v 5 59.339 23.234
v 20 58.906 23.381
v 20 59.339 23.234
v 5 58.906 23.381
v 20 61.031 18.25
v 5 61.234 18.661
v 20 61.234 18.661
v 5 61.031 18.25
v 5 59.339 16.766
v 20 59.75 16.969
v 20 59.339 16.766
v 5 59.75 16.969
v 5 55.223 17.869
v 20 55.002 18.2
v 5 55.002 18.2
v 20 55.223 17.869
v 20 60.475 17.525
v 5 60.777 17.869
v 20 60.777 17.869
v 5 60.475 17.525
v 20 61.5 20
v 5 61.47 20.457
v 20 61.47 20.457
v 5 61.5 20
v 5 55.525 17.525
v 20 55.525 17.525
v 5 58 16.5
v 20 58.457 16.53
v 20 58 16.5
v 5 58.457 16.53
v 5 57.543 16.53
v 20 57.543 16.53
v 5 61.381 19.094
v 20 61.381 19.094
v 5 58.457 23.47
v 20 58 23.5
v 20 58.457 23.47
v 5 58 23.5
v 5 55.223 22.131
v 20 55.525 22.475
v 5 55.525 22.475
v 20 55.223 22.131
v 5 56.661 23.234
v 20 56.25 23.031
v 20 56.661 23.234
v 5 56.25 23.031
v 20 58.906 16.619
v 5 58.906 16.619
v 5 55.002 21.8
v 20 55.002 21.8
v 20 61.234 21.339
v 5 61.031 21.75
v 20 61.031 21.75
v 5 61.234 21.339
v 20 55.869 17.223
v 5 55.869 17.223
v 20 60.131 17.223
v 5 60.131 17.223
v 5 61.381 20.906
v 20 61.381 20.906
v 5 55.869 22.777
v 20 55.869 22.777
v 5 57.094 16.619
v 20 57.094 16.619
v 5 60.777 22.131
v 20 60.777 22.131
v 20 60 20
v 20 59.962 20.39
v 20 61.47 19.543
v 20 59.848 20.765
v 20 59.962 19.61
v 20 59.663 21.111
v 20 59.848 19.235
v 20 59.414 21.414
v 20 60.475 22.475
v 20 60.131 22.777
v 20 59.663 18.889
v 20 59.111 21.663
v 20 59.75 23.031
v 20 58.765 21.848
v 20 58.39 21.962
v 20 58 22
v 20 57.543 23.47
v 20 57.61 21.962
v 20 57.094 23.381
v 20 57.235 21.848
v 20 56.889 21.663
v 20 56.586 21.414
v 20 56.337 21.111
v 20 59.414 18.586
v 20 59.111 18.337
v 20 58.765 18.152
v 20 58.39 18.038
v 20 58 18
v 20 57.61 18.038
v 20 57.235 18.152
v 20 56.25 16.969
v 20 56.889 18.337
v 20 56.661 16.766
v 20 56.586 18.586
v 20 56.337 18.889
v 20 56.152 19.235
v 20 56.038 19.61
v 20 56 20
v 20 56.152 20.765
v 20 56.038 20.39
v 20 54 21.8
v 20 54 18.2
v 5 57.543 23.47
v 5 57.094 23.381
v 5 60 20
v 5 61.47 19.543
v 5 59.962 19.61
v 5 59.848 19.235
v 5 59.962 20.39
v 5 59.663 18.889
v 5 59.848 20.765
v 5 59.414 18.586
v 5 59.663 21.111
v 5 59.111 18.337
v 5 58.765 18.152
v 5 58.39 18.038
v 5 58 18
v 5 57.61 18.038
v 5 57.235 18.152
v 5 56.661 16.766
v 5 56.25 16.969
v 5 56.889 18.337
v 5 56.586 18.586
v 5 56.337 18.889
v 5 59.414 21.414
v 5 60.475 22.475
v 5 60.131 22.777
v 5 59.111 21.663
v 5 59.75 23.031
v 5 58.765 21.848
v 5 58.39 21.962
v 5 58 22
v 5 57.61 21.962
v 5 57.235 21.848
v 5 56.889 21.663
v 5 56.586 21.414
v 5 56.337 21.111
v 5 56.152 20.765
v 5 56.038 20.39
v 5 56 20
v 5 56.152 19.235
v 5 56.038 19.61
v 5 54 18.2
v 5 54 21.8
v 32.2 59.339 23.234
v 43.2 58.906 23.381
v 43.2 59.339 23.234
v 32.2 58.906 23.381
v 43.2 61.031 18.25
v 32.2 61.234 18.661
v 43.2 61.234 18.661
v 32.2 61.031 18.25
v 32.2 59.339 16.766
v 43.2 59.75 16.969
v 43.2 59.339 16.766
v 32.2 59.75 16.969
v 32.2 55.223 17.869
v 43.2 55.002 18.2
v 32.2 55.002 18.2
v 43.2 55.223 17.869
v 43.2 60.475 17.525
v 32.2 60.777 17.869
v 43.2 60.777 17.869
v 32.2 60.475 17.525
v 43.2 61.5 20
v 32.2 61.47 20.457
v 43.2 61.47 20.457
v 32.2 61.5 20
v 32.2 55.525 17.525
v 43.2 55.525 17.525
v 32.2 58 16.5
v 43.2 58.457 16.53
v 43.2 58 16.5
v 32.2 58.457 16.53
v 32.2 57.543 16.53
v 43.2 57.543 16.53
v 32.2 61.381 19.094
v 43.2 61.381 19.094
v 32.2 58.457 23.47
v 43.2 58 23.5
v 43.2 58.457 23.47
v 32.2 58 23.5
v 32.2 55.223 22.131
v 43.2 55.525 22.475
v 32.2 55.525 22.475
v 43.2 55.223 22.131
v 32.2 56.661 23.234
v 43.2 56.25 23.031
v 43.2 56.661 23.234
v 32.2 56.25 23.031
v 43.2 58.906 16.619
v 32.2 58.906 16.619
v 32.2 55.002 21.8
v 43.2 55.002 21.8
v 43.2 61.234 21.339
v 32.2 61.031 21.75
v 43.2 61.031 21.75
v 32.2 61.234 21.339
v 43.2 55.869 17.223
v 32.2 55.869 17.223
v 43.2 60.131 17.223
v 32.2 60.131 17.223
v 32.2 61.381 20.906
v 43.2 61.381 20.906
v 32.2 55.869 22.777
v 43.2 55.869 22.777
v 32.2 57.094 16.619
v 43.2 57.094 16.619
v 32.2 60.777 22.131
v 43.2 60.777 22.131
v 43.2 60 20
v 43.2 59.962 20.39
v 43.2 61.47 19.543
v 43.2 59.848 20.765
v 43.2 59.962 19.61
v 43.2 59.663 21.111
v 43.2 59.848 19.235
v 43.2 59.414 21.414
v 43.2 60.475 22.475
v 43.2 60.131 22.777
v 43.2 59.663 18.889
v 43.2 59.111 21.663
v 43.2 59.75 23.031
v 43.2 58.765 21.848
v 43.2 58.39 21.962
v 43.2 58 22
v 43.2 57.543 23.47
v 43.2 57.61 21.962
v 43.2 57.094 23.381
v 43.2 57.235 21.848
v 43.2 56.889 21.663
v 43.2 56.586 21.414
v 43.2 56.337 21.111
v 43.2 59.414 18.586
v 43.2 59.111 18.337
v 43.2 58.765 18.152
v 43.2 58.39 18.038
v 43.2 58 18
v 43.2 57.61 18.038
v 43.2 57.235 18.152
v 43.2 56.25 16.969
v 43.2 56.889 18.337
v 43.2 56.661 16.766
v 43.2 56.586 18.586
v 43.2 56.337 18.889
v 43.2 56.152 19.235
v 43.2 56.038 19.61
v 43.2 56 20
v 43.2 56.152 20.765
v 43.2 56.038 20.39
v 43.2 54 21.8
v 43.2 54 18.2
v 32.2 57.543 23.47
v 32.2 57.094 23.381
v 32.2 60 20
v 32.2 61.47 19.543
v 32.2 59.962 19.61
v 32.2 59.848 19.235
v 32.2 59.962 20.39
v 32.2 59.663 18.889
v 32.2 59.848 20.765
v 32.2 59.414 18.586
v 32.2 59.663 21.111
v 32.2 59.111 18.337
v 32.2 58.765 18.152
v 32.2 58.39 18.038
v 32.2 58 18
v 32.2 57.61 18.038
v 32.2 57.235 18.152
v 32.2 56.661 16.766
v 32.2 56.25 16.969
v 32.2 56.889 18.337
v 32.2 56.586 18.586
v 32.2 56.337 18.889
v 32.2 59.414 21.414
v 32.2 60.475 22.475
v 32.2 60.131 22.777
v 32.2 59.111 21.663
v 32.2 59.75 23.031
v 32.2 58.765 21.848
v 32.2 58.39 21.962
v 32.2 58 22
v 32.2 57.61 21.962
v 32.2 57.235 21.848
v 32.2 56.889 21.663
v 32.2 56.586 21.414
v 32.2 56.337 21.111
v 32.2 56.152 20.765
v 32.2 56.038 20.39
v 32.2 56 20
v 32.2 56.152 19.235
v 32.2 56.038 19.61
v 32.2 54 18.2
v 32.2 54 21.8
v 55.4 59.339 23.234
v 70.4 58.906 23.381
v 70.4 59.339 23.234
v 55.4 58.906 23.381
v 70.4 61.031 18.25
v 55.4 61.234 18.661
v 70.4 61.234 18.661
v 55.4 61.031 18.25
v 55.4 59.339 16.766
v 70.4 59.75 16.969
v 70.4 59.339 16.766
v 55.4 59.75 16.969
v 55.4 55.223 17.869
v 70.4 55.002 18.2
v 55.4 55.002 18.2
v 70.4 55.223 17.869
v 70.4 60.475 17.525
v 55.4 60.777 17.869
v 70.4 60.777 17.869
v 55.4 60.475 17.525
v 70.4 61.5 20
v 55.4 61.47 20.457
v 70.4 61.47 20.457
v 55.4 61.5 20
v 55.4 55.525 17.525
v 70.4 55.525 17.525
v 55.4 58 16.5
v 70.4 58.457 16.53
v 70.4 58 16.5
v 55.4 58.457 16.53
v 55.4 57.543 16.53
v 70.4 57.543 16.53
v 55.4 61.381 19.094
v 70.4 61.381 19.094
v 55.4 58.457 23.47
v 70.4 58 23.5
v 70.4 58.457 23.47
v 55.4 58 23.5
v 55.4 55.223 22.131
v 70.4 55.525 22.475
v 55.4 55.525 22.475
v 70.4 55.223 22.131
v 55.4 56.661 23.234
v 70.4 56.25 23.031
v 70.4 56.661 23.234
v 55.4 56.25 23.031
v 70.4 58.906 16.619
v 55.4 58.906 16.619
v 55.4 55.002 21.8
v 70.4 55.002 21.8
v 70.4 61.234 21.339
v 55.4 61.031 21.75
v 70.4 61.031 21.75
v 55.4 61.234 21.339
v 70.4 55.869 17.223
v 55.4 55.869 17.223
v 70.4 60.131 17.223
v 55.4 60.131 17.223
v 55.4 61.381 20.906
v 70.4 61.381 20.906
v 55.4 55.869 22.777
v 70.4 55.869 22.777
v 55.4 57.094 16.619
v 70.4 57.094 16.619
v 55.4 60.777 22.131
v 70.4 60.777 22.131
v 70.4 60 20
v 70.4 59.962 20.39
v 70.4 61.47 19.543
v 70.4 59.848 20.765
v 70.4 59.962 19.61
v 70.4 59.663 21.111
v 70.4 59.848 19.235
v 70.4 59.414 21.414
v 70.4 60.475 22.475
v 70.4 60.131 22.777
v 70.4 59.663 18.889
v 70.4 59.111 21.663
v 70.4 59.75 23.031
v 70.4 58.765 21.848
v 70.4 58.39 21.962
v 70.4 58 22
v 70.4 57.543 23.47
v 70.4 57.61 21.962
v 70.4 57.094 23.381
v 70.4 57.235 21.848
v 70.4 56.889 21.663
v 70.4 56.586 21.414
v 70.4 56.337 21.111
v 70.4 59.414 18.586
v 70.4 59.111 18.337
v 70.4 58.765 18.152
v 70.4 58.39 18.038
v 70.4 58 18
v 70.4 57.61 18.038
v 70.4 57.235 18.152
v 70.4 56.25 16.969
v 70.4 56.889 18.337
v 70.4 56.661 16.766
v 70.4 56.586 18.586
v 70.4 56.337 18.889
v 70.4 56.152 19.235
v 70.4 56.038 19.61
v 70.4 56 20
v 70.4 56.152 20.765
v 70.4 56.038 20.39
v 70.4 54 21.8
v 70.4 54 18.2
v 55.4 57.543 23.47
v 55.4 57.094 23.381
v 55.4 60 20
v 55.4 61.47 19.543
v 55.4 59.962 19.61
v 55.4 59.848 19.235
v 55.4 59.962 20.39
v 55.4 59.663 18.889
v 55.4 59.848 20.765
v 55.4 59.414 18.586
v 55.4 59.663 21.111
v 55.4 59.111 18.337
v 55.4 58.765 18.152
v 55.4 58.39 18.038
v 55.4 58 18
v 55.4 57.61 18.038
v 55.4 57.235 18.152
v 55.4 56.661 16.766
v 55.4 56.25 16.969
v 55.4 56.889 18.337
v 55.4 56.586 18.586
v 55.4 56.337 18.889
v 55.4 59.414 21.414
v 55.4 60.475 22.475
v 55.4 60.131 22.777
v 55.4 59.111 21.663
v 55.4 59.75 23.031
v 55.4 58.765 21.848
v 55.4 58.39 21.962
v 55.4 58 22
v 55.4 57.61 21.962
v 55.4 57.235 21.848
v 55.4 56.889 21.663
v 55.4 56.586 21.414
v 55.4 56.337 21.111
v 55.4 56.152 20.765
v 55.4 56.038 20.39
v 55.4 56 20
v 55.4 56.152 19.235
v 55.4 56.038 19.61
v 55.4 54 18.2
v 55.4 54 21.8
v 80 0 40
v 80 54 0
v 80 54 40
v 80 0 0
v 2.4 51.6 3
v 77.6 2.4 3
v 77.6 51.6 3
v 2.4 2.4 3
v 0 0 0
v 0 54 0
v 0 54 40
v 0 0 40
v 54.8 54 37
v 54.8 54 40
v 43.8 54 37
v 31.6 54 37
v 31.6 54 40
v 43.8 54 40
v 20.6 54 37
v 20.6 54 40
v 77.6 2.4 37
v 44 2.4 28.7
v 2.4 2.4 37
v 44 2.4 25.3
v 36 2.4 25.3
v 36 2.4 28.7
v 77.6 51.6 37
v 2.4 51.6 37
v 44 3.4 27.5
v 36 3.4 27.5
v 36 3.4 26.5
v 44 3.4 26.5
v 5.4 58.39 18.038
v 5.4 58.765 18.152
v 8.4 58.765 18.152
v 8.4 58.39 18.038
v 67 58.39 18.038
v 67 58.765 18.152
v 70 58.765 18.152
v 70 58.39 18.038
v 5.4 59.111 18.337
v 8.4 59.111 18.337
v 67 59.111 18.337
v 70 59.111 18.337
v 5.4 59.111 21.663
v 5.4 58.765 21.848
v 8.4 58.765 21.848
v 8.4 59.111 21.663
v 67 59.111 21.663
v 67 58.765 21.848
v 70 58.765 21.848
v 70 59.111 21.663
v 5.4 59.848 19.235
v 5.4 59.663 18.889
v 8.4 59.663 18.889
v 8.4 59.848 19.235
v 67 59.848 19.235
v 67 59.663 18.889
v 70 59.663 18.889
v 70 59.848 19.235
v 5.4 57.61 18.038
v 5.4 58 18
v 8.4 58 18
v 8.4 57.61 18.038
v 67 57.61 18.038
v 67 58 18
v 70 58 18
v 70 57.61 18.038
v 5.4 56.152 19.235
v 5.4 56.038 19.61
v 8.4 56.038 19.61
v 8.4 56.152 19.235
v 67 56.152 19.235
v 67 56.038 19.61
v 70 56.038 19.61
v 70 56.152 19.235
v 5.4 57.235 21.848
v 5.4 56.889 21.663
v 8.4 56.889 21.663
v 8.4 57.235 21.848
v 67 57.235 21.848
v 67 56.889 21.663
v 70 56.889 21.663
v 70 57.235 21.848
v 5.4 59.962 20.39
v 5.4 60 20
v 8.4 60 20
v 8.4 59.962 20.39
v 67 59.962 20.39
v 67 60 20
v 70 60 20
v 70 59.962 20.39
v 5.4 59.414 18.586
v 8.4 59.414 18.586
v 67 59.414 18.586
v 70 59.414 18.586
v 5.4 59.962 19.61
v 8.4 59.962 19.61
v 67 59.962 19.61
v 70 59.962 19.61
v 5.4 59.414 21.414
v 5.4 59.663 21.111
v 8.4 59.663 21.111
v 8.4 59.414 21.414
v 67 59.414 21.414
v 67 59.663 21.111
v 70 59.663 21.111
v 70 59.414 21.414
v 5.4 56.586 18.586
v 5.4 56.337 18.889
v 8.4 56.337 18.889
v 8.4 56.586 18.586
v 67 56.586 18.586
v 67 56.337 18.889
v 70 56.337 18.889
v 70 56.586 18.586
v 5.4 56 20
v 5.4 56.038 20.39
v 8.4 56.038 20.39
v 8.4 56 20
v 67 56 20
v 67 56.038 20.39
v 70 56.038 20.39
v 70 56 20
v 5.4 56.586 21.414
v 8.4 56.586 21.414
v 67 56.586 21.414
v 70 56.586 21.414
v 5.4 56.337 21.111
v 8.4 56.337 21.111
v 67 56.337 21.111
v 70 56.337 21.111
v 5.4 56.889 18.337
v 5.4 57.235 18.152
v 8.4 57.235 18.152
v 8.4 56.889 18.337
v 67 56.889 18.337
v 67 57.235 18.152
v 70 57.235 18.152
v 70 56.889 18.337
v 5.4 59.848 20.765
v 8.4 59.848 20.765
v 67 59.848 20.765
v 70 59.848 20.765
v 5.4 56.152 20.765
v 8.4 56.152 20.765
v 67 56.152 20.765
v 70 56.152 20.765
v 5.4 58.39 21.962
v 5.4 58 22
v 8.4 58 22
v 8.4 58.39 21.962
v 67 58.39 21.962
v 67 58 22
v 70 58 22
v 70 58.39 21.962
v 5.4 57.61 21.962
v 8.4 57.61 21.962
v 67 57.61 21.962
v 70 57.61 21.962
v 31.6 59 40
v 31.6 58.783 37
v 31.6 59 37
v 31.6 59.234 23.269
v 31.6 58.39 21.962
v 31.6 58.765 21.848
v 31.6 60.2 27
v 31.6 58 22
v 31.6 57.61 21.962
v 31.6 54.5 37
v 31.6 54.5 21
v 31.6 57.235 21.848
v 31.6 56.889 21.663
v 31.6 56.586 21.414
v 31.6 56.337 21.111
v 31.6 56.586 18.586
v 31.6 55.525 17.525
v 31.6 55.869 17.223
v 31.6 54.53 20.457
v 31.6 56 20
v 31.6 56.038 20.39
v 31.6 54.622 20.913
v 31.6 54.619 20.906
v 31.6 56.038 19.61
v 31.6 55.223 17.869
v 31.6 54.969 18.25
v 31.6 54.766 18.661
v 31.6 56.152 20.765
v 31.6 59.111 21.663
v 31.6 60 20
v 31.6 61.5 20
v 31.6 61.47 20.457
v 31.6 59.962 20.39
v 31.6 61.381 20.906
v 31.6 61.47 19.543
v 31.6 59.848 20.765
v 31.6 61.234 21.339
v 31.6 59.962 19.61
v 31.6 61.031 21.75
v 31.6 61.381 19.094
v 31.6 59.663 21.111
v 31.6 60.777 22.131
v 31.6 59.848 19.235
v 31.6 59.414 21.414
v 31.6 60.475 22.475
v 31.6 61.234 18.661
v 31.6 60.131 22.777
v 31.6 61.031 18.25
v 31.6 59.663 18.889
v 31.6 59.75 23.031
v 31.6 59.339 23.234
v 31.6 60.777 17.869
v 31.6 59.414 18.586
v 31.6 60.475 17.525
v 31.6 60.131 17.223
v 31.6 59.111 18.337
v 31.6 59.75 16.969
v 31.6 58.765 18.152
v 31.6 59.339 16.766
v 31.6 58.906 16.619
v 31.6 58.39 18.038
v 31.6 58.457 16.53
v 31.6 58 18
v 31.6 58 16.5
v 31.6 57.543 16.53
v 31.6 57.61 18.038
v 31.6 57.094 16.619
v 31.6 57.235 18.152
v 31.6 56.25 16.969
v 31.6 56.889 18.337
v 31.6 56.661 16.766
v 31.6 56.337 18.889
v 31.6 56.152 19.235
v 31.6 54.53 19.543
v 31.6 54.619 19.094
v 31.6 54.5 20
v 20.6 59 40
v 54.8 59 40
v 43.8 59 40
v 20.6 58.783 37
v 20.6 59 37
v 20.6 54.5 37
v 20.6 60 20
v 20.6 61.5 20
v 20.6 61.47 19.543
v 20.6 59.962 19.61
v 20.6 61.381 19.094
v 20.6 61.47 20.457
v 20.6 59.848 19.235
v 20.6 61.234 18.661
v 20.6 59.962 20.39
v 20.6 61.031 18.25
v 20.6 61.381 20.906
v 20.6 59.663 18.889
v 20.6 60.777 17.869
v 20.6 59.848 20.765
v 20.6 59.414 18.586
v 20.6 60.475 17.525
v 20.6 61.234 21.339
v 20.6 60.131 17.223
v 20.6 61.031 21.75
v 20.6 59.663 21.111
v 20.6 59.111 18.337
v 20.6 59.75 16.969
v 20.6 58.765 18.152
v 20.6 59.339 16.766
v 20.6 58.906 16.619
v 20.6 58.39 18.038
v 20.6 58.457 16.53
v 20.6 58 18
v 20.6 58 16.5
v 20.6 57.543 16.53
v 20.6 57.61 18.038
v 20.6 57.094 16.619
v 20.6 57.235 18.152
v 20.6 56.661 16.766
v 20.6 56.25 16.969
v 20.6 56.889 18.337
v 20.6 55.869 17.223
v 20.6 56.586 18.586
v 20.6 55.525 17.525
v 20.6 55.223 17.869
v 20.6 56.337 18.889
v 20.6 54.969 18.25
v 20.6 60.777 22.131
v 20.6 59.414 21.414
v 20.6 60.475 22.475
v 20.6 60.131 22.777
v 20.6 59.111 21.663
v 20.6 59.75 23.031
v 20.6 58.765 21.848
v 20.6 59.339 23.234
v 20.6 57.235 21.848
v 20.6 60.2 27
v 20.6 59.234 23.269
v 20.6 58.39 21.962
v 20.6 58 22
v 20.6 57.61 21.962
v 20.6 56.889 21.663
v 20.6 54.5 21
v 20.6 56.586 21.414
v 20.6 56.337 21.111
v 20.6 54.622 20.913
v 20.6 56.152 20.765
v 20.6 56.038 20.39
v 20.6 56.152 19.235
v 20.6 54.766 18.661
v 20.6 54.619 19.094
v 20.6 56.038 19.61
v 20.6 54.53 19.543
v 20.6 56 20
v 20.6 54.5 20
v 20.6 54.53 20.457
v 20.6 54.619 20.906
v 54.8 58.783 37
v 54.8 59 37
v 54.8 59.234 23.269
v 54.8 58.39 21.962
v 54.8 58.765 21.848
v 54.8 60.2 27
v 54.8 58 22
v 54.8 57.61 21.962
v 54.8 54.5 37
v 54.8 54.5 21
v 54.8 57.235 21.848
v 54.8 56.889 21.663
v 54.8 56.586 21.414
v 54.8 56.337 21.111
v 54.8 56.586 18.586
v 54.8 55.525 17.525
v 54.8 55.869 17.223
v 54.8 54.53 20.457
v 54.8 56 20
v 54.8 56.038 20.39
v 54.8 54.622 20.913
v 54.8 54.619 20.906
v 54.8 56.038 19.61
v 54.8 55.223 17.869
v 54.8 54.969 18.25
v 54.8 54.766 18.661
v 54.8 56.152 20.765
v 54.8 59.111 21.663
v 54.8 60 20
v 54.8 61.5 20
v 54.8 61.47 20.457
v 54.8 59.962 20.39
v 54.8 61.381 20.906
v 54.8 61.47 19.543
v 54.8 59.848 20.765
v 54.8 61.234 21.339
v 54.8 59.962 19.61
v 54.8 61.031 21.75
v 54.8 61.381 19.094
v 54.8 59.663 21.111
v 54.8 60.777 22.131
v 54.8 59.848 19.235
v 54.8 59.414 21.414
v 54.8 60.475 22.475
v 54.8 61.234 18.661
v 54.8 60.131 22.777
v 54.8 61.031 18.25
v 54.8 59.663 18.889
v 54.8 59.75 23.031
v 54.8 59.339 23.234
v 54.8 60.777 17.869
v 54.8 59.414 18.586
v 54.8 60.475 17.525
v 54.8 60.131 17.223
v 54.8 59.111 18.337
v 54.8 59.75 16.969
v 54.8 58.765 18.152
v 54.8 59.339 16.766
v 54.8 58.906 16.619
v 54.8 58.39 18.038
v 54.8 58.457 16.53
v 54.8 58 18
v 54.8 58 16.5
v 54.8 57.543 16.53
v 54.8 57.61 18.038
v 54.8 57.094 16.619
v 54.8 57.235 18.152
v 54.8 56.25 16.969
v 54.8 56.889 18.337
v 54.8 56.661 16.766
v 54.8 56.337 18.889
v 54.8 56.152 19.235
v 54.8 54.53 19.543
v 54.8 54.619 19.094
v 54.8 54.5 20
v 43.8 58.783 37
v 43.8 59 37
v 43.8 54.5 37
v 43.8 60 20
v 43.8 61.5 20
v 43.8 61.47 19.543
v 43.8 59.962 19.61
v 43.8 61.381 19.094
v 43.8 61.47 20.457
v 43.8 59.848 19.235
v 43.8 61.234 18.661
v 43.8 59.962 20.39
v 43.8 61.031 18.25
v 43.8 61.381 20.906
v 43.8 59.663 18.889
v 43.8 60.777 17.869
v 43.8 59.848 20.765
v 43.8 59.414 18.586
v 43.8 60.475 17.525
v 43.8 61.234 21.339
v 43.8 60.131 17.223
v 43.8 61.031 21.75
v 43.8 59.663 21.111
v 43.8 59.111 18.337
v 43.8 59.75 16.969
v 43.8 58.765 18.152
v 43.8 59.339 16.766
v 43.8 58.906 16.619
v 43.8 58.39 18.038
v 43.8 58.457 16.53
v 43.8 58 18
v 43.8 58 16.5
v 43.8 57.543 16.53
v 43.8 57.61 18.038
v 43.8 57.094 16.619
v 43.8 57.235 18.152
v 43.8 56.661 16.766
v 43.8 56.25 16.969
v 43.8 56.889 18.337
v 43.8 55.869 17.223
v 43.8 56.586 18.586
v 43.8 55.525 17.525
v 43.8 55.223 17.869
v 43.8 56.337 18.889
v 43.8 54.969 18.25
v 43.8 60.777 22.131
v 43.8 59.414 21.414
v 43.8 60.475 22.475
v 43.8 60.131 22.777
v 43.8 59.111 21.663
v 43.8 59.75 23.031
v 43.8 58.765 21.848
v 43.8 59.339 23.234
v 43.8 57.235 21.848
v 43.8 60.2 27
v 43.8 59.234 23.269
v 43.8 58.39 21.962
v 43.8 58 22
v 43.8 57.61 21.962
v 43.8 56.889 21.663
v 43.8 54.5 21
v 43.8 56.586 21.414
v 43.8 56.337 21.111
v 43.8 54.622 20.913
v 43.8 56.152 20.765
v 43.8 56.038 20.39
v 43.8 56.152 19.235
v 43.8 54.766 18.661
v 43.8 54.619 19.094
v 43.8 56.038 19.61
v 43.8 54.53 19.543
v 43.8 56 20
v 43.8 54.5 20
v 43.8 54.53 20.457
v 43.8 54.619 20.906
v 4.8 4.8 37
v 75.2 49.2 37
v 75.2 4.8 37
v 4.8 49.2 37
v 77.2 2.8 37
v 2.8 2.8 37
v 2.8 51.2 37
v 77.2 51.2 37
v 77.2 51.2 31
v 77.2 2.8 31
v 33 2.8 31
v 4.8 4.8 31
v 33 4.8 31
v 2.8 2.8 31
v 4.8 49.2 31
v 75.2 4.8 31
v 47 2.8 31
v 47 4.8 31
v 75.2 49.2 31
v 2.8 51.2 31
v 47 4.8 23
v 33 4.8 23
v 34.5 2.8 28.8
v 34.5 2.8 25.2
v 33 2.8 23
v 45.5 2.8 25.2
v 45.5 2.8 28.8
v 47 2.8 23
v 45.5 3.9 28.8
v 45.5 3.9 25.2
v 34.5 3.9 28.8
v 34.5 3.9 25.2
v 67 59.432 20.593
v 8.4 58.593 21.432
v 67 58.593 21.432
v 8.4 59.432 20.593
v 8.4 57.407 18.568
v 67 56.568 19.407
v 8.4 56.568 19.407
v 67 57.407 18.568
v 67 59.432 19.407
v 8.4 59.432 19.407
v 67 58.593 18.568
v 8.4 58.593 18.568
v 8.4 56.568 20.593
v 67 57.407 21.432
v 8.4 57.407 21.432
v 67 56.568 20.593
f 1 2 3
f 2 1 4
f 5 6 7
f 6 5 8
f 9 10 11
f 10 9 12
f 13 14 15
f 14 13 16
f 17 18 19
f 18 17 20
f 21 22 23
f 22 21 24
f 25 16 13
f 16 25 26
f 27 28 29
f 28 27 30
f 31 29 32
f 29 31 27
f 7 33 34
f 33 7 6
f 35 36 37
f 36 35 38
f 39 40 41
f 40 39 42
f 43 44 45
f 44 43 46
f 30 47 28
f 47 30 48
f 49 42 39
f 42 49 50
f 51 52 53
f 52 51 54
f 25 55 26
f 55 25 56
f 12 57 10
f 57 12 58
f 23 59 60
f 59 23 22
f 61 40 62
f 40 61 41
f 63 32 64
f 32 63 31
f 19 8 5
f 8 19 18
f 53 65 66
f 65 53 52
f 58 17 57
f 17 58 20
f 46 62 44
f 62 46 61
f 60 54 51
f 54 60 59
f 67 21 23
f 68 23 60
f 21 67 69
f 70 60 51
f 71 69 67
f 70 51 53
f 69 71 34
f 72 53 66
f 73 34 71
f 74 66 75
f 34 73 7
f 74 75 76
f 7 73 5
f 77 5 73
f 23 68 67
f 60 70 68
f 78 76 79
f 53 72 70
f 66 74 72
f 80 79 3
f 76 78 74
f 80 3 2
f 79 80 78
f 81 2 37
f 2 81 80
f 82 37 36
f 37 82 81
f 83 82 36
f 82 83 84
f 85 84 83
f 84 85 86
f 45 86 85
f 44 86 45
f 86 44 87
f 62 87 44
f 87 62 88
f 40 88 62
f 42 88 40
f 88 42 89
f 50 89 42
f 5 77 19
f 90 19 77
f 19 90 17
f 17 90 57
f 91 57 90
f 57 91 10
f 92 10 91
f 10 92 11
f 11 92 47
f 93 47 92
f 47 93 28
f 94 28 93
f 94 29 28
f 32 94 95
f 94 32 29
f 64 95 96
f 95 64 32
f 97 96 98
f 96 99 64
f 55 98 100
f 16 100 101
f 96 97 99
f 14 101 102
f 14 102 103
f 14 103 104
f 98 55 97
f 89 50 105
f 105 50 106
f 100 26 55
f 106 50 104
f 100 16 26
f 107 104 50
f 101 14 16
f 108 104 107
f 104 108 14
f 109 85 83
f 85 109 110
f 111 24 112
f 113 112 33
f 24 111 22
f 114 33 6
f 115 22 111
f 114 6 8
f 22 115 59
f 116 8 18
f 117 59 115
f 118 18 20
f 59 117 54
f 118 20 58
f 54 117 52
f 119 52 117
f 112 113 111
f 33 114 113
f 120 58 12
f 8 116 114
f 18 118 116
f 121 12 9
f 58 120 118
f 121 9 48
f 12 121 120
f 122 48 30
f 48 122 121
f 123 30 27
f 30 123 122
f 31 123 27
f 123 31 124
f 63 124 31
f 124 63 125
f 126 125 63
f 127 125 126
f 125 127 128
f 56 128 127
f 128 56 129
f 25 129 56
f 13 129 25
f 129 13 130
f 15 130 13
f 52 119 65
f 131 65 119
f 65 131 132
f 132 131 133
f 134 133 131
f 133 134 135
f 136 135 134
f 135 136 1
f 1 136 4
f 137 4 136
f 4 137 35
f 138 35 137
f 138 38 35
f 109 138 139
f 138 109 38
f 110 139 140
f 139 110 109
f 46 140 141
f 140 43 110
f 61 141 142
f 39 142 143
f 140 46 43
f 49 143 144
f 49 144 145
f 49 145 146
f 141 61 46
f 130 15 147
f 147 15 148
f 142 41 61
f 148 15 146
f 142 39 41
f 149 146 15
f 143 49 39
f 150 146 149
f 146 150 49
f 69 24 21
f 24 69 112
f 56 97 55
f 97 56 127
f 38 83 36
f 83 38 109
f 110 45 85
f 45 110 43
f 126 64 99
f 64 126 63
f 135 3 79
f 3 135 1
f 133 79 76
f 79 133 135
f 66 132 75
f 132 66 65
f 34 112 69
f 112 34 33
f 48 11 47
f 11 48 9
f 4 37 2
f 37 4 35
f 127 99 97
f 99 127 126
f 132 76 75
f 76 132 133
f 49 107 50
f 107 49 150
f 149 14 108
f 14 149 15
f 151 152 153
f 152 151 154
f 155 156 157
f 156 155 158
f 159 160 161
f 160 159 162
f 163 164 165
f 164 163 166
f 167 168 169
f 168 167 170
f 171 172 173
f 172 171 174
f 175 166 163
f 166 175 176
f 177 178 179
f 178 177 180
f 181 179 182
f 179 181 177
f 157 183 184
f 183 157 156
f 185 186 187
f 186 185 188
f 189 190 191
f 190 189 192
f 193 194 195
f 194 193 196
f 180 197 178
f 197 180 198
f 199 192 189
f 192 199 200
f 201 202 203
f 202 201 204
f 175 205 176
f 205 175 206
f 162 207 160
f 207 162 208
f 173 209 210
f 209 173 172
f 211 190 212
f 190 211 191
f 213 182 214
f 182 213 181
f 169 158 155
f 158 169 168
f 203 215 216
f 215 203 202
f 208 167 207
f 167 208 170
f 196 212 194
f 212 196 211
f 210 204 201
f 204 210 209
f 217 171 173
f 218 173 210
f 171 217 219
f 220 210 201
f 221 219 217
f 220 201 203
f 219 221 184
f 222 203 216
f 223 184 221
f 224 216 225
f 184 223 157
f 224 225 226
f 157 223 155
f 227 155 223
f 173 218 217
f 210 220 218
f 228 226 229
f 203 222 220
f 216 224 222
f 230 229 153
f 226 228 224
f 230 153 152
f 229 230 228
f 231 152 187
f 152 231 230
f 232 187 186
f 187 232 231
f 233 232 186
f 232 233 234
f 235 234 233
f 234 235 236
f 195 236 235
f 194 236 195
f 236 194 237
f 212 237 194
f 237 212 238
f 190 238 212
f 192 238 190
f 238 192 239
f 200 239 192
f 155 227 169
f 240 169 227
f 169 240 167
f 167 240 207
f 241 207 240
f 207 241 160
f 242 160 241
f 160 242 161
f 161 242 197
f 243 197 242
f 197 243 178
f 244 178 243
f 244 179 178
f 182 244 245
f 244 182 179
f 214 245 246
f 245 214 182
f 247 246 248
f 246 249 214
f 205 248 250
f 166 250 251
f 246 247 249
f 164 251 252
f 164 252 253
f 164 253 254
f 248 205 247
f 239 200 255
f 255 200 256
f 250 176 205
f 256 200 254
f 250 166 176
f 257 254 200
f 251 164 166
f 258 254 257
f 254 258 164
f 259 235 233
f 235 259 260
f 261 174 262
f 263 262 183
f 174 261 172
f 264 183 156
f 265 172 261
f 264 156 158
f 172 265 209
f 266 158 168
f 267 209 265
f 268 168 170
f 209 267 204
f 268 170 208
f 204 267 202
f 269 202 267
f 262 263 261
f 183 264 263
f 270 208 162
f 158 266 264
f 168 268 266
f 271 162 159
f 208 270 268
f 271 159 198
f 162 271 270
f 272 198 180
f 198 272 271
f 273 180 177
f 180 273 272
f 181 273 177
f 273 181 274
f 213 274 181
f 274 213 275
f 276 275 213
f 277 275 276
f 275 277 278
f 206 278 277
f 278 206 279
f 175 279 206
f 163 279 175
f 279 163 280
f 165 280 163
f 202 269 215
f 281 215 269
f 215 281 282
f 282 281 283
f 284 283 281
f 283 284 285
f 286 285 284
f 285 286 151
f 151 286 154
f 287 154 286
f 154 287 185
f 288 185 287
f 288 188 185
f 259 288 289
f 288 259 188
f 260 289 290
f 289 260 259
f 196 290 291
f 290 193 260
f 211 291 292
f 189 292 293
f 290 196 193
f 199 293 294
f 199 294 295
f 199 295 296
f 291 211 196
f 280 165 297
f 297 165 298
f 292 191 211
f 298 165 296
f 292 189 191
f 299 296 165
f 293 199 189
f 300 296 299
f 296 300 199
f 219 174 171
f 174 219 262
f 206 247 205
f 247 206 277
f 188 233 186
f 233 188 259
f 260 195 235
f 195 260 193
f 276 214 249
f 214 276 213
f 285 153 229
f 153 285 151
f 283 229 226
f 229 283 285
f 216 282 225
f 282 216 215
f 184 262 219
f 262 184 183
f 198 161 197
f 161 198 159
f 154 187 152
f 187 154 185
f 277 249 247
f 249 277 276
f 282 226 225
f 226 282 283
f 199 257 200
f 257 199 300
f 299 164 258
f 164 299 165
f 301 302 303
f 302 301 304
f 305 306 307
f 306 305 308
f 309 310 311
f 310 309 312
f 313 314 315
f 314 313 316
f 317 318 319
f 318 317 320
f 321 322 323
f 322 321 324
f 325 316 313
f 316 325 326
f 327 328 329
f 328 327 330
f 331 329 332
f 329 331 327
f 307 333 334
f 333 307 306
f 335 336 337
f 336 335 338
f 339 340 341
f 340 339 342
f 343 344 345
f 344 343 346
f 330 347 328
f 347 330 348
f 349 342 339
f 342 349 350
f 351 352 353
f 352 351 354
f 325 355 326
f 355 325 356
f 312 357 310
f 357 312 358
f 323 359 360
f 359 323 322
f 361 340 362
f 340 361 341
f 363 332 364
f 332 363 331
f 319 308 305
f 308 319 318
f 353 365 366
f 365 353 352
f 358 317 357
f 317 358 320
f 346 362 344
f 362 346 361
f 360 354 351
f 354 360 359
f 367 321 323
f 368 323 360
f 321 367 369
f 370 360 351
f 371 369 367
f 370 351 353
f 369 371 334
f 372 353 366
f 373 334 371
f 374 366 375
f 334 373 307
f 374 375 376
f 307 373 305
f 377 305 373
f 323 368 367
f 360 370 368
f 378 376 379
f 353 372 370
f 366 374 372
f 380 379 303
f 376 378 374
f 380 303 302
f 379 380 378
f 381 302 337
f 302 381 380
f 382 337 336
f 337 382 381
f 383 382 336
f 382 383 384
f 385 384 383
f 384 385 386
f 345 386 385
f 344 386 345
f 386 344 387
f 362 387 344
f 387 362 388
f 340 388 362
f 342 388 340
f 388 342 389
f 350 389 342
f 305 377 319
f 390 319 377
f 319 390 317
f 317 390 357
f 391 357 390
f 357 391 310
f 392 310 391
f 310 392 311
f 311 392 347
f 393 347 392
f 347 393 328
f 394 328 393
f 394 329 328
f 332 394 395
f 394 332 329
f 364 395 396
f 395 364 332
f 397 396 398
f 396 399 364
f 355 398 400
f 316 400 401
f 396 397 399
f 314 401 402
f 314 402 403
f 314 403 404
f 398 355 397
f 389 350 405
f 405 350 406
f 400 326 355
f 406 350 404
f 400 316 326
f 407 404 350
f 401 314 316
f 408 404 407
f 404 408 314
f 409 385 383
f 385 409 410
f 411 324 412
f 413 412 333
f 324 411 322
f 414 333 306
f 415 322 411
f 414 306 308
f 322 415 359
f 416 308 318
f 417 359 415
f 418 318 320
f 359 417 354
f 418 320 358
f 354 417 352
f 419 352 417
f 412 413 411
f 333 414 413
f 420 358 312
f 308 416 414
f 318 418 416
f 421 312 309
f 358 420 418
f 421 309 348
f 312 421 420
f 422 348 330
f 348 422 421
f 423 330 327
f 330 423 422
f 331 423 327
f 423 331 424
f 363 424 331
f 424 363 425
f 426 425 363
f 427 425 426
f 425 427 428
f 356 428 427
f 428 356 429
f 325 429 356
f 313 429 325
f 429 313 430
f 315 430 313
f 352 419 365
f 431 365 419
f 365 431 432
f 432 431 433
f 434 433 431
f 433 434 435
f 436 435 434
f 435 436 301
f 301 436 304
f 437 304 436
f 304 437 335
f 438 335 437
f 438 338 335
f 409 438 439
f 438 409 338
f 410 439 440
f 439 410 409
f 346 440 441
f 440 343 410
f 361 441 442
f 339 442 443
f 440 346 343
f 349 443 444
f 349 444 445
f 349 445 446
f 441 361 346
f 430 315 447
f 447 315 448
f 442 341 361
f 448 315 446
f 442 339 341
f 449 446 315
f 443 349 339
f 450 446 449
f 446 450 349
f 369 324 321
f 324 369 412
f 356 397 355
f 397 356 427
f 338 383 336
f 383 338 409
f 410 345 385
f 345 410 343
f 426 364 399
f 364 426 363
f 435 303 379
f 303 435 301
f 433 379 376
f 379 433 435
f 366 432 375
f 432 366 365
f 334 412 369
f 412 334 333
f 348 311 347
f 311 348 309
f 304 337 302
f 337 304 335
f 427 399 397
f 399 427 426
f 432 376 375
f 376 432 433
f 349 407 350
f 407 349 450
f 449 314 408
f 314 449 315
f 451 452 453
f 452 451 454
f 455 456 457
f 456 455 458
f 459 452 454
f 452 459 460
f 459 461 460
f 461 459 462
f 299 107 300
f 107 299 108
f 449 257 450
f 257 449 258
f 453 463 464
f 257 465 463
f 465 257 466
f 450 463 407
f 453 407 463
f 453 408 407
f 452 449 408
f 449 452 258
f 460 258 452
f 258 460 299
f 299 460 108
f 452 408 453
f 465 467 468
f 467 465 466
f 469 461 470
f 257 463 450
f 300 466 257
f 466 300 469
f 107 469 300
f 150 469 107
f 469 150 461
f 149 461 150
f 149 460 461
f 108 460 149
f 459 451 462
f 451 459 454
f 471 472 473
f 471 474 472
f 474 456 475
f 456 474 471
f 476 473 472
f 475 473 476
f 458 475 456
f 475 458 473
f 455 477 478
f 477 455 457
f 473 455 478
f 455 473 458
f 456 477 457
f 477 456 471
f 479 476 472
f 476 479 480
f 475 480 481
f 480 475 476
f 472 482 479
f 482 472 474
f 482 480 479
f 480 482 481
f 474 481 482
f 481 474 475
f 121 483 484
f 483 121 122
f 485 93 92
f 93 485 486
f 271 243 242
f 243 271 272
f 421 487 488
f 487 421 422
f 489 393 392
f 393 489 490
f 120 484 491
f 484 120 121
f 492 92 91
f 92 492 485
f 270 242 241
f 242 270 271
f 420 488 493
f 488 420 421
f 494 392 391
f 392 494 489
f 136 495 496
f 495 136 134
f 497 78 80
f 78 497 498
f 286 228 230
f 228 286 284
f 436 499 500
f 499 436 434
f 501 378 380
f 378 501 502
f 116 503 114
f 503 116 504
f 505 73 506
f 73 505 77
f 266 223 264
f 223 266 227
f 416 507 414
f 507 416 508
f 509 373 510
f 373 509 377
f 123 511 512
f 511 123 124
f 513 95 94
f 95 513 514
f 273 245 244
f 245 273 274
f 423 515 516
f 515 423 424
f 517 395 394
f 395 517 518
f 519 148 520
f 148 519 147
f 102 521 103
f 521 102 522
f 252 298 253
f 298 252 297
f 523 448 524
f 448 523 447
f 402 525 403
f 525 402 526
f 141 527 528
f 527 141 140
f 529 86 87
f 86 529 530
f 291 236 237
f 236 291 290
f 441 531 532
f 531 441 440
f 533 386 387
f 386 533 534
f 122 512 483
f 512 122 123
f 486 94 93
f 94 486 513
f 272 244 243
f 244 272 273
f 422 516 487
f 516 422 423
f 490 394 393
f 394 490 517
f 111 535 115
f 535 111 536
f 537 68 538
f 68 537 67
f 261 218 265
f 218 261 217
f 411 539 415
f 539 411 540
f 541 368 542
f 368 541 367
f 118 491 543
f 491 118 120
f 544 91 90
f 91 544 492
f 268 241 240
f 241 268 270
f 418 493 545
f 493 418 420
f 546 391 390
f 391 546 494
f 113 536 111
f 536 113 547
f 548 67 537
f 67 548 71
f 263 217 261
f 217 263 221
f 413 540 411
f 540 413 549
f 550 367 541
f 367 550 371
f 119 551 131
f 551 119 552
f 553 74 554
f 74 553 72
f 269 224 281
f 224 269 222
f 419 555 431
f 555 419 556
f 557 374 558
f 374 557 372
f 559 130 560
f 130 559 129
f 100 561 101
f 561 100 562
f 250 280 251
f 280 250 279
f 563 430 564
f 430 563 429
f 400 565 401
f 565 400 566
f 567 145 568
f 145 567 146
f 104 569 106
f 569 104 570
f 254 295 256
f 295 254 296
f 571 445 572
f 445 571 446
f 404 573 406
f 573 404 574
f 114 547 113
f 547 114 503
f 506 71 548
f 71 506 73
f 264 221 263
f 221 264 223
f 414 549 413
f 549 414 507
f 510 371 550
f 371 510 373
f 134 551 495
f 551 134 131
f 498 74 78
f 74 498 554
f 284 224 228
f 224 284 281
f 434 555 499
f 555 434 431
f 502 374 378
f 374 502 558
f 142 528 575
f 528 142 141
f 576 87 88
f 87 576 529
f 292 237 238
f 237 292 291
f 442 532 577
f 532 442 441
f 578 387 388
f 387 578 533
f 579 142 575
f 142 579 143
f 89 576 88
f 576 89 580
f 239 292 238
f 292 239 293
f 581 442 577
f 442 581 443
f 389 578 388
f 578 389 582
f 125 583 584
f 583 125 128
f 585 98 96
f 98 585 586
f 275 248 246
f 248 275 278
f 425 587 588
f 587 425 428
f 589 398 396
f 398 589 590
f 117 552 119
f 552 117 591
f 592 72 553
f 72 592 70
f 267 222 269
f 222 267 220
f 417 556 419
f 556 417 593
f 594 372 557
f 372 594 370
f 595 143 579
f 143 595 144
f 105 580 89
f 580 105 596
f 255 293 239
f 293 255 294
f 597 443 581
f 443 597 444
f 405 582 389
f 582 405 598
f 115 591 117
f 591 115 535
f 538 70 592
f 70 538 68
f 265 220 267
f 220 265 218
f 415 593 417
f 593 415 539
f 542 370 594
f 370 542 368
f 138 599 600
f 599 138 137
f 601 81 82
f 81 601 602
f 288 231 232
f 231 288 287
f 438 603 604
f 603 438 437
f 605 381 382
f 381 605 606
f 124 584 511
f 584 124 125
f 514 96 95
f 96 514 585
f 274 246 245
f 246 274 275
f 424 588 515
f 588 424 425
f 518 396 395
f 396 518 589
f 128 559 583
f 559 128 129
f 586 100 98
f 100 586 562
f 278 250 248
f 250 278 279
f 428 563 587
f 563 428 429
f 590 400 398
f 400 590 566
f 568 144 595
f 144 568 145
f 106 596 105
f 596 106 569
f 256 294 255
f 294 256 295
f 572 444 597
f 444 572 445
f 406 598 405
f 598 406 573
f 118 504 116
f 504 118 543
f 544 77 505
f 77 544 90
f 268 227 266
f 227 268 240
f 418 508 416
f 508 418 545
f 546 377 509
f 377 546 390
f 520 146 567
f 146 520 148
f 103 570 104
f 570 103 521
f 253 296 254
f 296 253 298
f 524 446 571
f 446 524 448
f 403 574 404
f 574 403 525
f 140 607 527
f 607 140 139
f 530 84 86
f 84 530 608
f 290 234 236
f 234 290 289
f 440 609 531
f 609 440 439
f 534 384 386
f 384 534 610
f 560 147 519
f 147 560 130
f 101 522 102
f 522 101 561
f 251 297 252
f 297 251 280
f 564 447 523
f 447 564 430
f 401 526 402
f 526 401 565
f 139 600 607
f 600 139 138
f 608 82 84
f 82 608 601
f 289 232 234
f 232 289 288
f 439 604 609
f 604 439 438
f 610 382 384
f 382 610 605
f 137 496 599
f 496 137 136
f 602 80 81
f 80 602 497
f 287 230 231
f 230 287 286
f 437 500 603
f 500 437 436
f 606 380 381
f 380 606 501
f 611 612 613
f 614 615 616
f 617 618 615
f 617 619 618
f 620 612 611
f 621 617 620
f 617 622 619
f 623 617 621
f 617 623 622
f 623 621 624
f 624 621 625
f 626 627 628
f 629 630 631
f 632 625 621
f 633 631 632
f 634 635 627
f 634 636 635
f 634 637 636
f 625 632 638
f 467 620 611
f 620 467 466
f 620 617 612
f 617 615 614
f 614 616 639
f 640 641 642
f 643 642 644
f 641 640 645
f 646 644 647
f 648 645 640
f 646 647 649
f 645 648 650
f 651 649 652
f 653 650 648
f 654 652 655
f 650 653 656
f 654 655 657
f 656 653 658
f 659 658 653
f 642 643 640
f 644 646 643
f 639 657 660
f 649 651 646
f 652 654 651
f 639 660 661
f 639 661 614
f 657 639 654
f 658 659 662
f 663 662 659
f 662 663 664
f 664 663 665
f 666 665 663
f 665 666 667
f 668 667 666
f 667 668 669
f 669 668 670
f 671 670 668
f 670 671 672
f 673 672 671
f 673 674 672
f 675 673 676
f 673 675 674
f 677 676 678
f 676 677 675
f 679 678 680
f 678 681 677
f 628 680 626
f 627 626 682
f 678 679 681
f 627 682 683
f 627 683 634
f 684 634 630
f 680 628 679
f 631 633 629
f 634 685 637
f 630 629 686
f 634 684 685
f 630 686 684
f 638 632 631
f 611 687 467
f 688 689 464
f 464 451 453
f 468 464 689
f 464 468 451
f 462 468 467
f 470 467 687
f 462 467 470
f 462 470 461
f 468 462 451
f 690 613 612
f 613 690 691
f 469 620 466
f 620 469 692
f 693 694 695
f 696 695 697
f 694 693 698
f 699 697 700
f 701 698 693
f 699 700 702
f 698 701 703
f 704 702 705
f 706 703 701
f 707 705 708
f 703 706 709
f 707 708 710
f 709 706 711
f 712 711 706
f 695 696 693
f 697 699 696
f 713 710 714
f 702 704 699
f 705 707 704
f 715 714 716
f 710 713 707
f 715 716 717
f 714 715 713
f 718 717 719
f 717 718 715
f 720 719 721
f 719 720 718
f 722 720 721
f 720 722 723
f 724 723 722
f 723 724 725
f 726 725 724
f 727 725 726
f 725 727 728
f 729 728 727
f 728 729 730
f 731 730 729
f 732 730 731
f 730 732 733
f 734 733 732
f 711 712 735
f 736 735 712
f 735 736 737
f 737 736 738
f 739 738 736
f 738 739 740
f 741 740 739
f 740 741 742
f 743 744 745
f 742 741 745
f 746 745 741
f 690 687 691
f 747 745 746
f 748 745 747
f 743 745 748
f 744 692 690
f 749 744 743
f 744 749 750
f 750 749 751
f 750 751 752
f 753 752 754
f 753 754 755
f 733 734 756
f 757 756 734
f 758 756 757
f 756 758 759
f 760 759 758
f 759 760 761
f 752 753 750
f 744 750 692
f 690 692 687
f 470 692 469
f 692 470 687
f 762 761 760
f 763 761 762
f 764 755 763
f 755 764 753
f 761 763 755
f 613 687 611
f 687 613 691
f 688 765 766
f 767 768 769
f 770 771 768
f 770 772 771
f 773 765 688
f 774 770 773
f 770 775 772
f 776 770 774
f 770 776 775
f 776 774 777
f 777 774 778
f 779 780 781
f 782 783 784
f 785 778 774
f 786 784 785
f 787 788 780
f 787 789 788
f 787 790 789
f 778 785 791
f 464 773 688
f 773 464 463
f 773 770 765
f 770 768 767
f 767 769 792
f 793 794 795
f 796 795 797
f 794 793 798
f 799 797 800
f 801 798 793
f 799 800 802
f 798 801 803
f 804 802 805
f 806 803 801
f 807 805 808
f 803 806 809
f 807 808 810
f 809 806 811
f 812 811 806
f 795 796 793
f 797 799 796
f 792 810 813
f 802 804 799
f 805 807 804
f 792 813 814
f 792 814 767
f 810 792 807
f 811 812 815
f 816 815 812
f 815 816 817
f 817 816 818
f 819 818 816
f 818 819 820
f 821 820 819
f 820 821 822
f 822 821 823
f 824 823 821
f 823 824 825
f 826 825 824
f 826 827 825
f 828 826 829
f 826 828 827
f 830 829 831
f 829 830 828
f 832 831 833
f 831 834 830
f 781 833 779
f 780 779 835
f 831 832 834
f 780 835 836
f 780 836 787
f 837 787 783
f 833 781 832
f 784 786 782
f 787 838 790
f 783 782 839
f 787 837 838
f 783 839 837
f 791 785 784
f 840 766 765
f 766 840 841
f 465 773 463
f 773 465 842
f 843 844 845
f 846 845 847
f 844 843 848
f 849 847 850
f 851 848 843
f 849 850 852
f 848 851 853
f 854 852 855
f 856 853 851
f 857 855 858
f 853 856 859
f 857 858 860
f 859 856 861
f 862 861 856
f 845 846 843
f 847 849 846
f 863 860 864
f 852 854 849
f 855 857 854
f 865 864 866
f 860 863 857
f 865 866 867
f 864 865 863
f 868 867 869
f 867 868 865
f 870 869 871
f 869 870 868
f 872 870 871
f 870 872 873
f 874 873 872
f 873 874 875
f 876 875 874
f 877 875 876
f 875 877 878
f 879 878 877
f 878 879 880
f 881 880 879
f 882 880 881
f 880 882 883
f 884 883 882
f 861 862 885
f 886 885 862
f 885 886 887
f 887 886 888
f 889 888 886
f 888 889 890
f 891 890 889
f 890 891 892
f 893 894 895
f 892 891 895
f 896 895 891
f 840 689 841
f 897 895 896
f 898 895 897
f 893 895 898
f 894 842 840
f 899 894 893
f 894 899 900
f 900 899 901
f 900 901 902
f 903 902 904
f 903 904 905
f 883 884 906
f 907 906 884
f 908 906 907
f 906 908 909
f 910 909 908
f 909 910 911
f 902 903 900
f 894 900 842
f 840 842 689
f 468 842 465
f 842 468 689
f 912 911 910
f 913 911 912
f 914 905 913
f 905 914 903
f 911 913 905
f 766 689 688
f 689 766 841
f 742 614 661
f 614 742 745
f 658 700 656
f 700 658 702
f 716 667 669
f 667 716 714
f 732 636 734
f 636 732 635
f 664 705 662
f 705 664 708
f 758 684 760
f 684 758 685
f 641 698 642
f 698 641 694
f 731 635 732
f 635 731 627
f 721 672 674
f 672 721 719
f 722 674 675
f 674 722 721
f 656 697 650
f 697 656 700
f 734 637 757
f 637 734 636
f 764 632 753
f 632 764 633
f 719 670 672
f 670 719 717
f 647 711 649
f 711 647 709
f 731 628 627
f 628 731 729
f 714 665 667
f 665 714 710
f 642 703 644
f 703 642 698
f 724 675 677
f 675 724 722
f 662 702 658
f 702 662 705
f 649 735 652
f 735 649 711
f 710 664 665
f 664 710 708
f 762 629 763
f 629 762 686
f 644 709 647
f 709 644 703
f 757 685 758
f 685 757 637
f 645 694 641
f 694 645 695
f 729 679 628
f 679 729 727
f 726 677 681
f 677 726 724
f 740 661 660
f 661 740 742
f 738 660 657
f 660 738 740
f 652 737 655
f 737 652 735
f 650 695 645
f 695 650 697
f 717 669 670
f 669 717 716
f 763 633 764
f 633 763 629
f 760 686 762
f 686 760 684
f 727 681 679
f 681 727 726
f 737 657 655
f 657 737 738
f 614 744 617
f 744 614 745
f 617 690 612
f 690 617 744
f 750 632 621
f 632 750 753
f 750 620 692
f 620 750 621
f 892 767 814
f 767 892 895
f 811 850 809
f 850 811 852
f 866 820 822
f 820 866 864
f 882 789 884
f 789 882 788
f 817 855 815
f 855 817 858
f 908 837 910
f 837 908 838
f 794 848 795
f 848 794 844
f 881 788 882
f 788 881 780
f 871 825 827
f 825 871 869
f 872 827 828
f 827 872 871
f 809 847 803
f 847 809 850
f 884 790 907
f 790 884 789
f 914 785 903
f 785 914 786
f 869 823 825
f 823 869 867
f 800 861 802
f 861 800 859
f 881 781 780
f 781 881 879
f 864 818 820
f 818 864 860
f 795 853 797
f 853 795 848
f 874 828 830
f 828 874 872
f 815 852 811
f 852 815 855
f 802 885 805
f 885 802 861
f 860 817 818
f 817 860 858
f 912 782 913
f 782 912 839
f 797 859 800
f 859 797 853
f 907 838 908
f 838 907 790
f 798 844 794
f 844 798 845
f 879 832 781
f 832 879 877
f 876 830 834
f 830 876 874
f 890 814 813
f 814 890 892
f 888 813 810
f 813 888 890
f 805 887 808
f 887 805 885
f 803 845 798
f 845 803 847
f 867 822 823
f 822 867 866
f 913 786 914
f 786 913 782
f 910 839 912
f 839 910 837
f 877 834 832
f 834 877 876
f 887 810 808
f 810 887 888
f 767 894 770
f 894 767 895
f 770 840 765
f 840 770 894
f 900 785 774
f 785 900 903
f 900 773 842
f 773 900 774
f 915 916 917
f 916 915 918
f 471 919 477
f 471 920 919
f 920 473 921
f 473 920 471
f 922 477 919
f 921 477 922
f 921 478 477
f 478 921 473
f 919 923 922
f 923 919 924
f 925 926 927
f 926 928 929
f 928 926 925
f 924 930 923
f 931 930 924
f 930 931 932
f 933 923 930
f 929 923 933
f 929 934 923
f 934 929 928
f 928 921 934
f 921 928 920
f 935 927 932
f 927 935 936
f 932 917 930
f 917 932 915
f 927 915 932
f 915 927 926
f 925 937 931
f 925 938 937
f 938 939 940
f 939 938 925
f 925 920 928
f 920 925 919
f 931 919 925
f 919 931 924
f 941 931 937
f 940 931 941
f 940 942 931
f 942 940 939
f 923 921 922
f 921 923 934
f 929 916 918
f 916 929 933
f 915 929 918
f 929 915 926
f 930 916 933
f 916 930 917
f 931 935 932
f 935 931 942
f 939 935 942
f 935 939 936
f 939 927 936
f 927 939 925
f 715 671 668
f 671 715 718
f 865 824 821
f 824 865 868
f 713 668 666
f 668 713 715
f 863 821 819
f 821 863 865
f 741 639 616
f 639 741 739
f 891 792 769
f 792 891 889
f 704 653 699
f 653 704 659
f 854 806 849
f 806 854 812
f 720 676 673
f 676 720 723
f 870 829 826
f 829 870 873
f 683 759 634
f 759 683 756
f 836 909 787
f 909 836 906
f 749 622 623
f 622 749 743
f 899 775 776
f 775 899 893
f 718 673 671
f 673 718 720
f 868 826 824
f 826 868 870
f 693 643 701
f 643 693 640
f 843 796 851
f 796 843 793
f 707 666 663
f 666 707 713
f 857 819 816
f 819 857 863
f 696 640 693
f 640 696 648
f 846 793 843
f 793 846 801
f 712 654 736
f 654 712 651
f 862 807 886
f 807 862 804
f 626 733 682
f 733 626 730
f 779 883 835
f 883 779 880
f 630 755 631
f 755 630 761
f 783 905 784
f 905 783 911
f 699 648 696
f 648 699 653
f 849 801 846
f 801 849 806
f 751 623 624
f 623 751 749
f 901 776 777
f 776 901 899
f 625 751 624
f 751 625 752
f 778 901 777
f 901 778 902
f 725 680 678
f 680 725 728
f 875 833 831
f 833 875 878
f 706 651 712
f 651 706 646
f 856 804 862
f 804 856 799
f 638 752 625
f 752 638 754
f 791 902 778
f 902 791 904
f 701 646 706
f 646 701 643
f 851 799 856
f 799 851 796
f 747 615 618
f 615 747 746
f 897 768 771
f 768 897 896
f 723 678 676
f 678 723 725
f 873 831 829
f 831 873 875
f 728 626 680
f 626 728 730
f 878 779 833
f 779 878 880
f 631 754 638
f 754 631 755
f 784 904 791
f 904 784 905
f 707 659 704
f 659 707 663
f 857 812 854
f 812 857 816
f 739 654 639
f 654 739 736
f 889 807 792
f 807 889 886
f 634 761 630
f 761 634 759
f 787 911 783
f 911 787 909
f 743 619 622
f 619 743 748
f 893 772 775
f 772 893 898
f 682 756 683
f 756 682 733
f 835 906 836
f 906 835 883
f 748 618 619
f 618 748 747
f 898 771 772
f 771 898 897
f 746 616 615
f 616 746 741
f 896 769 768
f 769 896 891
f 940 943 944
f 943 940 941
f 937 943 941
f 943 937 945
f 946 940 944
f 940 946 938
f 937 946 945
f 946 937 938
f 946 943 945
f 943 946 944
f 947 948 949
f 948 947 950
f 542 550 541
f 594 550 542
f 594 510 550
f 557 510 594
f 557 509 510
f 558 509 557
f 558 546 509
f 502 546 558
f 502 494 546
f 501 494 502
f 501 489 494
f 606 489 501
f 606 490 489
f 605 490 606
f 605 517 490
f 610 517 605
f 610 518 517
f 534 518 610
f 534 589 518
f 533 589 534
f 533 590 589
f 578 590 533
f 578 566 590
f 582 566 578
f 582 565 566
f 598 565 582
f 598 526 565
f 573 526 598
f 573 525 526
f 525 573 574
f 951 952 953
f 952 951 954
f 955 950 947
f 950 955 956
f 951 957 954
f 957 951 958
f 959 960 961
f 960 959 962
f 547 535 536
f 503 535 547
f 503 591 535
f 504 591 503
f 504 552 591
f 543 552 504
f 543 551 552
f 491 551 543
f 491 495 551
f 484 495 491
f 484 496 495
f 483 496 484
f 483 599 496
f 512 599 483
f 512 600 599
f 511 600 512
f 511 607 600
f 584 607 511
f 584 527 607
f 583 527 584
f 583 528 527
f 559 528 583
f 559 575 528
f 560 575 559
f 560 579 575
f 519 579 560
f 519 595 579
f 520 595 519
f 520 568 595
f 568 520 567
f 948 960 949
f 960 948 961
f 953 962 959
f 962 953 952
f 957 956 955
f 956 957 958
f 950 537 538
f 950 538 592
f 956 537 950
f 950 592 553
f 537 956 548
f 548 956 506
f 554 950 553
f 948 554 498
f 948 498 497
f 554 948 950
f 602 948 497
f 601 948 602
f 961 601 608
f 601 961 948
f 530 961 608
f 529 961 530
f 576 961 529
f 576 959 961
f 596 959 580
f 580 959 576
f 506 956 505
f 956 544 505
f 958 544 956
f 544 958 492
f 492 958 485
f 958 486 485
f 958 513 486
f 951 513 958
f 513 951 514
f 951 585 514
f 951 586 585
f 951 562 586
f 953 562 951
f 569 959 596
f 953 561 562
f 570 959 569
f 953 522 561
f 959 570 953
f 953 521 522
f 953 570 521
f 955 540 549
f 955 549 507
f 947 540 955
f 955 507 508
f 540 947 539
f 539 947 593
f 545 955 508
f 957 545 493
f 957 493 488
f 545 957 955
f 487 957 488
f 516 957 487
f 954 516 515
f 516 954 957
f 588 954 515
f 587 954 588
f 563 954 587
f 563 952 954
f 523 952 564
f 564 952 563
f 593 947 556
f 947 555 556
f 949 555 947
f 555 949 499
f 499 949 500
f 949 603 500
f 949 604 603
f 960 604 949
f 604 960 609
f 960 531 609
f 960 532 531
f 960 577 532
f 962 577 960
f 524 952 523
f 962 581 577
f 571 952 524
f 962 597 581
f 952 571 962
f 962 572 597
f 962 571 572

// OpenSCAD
// Box with print-in-place hinge
// Closed body 80 (x) x 54 (y body, 61.5 incl. hinge) x 40 (z) mm.
// Lid occupies the top 10 mm. Hinge pin axis: y=58, z=20 (mid-height at the
// back), so swinging the lid -180 deg about that axis lays the lid flat on
// the bed behind the box: that is the print-in-place pose.
// Clearances (PLA, 0.4 nozzle): pin/bore 0.40 radial, knuckle axial gaps
// 0.6, lid lip to box walls 0.4, lid barrels to box back wall 0.5.

part = "assembly"; // [assembly, box, lid, pin]
cadverify_only = "";

W = 80; D = 54; H = 40; box_h = 30;
wall = 2.4; floor_t = 3; plate_t = 3;
hinge_y = 58; hinge_z = 20;
barrel_r = 3.5; bore_r = 2.0; pin_r = 1.55; cap_r = 2.9;
hinge_ymax = hinge_y + barrel_r;          // 61.5
box_segs  = [[5, 15], [32.2, 11], [55.4, 15]];   // [x0, len] outer ones cover the pin caps
lid_segs  = [[20.6, 11], [43.8, 11]];
pin_x0 = 5.4; pin_len = 64.6;

module instance(name, partname, unit = 1) {
    echo(cadverify_instance = [name, partname, unit]);
    if (cadverify_only == "" || cadverify_only == name) children();
}

// Extrude a (y,z) profile along +x starting at x0, offset by (oy,oz).
module extrude_yz(profile, x0, len, oy = 0, oz = 0) {
    multmatrix([[0,0,1,x0],[1,0,0,oy],[0,1,0,oz],[0,0,0,1]])
        linear_extrude(height = len) polygon(points = profile);
}

module barrel(x0, len) {
    translate([x0, hinge_y, hinge_z]) rotate([0, 90, 0])
        cylinder(h = len, r = barrel_r, $fn = 48);
}

module bore_cut() {
    translate([4, hinge_y, hinge_z]) rotate([0, 90, 0])
        cylinder(h = 72, r = bore_r, $fn = 32);
}

module box_closed() {
    difference() {
        union() {
            // floor and walls up to z=30
            translate([0, 0, 0]) cube([W, D, floor_t]);
            translate([0, 0, floor_t]) cube([W, wall, box_h - floor_t]);              // front
            translate([0, D - wall, floor_t]) cube([W, wall, box_h - floor_t]);       // back
            translate([0, wall, floor_t]) cube([wall, D - 2*wall, box_h - floor_t]);  // left
            translate([W - wall, wall, floor_t]) cube([wall, D - 2*wall, box_h - floor_t]); // right
            // front catch detent bump on the inner front wall (wedged ridge)
            extrude_yz([[2.4,25.3],[3.4,26.5],[3.4,27.5],[2.4,28.7]], 36, 8);
            // hinge knuckles + arms to the back wall
            for (s = box_segs) {
                barrel(s[0], s[1]);
                translate([s[0], 53.5, hinge_z - 1.8]) cube([s[1], 5, 3.6]);
            }
        }
        bore_cut();
    }
}

module lid_closed() {
    difference() {
        union() {
            // top plate + back hinge tabs
            translate([0, 0, H - plate_t]) cube([W, D, plate_t]);
            for (s = lid_segs) translate([s[0], 53, H - plate_t]) cube([s[1], 6, plate_t]);
            // external skirt (down to z=30, flush with box walls outside)
            translate([0, 0, box_h]) cube([W, wall, H - plate_t - box_h]);                  // front
            translate([0, D - wall, box_h]) cube([W, wall, H - plate_t - box_h]);           // back
            translate([0, wall, box_h]) cube([wall, D - 2*wall, H - plate_t - box_h]);      // left
            translate([W - wall, wall, box_h]) cube([wall, D - 2*wall, H - plate_t - box_h]); // right
            // inner sealing lip (0.4 clear of box inner walls)
            translate([2.8, 2.8, 31]) cube([74.4, 2, 6]);        // front lip
            translate([2.8, 49.2, 31]) cube([74.4, 2, 6]);       // back lip
            translate([2.8, 4.8, 31]) cube([2, 44.4, 6]);        // left lip
            translate([75.2, 4.8, 31]) cube([2, 44.4, 6]);       // right lip
            // central catch tongue on the front lip, reaching down to z=23
            translate([33, 2.8, 23]) cube([14, 2, 8]);
            // hinge knuckles + diagonal straps up to the plate tabs
            for (s = lid_segs) {
                barrel(s[0], s[1]);
                extrude_yz([[54.5,39],[58.5,39],[60.2,27],[58,18.5],[54.5,21]], s[0], s[1]);
            }
        }
        bore_cut();
        // catch groove in the tongue (receives the box detent bump when shut)
        translate([34.5, 2.7, 25.2]) cube([11, 1.2, 3.6]);
        // fingernail scoop in the front skirt bottom edge
        translate([40, -1, box_h]) rotate([90, 0, 0]) cylinder(h = 4, r = 4.5, $fn = 32);
    }
}

function oct_pts(r) = [for (i = [0:7]) let (a = 22.5 + 45*i) [r*cos(a), r*sin(a)]];

module pin_closed() {
    // stepped octagonal axle (flats top/bottom), captive caps both ends
    extrude_yz(oct_pts(pin_r), pin_x0, pin_len, hinge_y, hinge_z);
    extrude_yz(oct_pts(cap_r), pin_x0, 3, hinge_y, hinge_z);
    extrude_yz(oct_pts(cap_r), pin_x0 + pin_len - 3, 3, hinge_y, hinge_z);
}

// --- printed (as-exported) orientations ---
module lid_printed() {
    // closed lid rotated 180 deg about the hinge axis, then dropped to y=0
    translate([0, hinge_ymax, H]) rotate([180, 0, 0]) lid_closed();
}
pin_off = cap_r * cos(22.5); // 2.679 half-height of the octagonal caps
module pin_printed() {
    translate([-pin_x0, -(hinge_y - pin_off), -(hinge_z - pin_off)]) pin_closed();
}

box_spec = [
    ["bounds", [[0, 0, 0], [W, hinge_ymax, box_h]]],
    ["bodies", 1],
    ["support_faces", [["bed", "-z", 4000]]],
    ["overhangs_allowed", [
        ["hinge barrels and arms: horizontal print-in-place axle housings, bore is self-supported inside the tube", [[8, 53, 16], [67.5, 62, 24]]]
    ]],
    ["copies", 1],
    ["details", [
        ["floor", "material", [[10, 10, 0.5], [70, 44, 2.5]], 0.98],
        ["interior", "void", [[6, 6, 8], [74, 48, 24]], 0.98],
        ["front_wall", "thickness", [40, -1, 15], [0, 1, 0], 2.4],
        ["knuckle_arm", "material", [[10, 53.8, 18.8], [19, 55.8, 21.2]], 0.9],
        ["hinge_bore", "void", [[10, 56.7, 18.7], [19, 59.3, 21.3]], 1.0],
        ["catch_bump", "material", [[37, 2.6, 26.6], [43, 3.3, 27.4]], 0.85],
        ["catch_bump_view", "view", [[35, 2, 24], [45, 4.5, 29.5]]],
        ["hinge_view", "view", [[8, 53, 15], [67, 62, 25]]]
    ]]
];

lid_spec = [
    ["bounds", [[0, 0, 0], [W, hinge_ymax, 23.5]]],
    ["bodies", 1],
    ["support_faces", [["bed", "-z", 4000]]],
    ["overhangs_allowed", [
        ["hinge barrels and straps: horizontal print-in-place axle housings", [[20, 0, 0], [55.5, 8, 24]]],
        ["catch groove underside in print pose", [[34, 56, 11], [46, 59, 15]]]
    ]],
    ["copies", 1],
    ["details", [
        ["top_plate", "material", [[10, 17.5, 0.5], [70, 51.5, 2.5]], 0.98],
        ["front_skirt", "material", [[10, 59.3, 4.5], [70, 61.3, 7.5]], 0.9],
        ["plate_thickness", "thickness", [40, 30, -1], [0, 0, 1], 3],
        ["tongue", "material", [[38, 57, 9.2], [42, 58.5, 10.3]], 0.85],
        ["catch_groove", "void", [[37, 57.7, 12], [43, 58.5, 14]], 1.0],
        ["hinge_bore", "void", [[23, 2.2, 18.7], [29, 4.8, 21.3]], 1.0],
        ["strap", "material", [[23, 3.5, 8], [29, 6.5, 12]], 0.8],
        ["catch_groove_view", "view", [[33, 56.5, 9], [47, 59, 17]]],
        ["lid_knuckle_view", "view", [[20, 0, 16], [32, 8, 24]]]
    ]]
];

pin_spec = [
    ["bounds", [[0, 0, 0], [pin_len, 2*pin_off, 2*pin_off]]],
    ["bodies", 1],
    ["support_faces", [["bed", "-z", 12]]],
    ["overhangs_allowed", [
        ["lower facets of the horizontal print-in-place axle, 0.4 above the bore that supports it", [[-0.1, -0.1, -0.1], [64.7, 5.5, 1.6]]]
    ]],
    ["copies", 1],
    ["details", [
        ["shaft", "material", [[10, 1.8, 1.8], [50, 3.55, 3.55]], 0.9],
        ["cap", "material", [[0.5, 1.0, 1.0], [2.5, 4.35, 4.35]], 0.7],
        ["cap_thickness", "thickness", [1.5, pin_off, -1], [0, 0, 1], 5.358],
        ["pin_end_view", "view", [[0, 0, 0], [3, 5.36, 5.36]]]
    ]]
];

assembly_spec = [
    ["bounds", [[0, 0, 0], [W, hinge_ymax, H]]],
    ["support_faces", [["table", "-z", 4000]]],
    ["motions", [
        ["lid_swing", ["lid"], "rotate", [0, hinge_y, hinge_z], [1, 0, 0], [-180, 0],
            ["flex", [["lid", "box", 1.0, "front catch tongue snaps 0.6 mm over the detent bump while closing"]]]]
    ]],
    ["assembly_order", [
        [["box"], [0, 0, 0]],
        [["lid"], [0, 0, -1]],
        [["pin"], [1, 0, 0]]
    ]],
    ["print_in_place", 0.4],
    ["print_pose", [["lid_swing", -180]]],
    ["overhangs_allowed", [
        ["box hinge barrels in print pose", [[8, 53, 16], [67.5, 62, 24]]],
        ["lid hinge barrels and straps in print pose", [[20, 53, 0], [56, 62, 24]]],
        ["horizontal pin inside its bore, 0.4 above the bore surface", [[5, 55, 16.5], [70.5, 61, 20]]],
        ["lid catch groove in print pose", [[33, 110, 2], [47, 114, 18]]]
    ]]
];

if (part == "box") {
    echo(cadverify_spec = box_spec);
    box_closed();
} else if (part == "lid") {
    echo(cadverify_spec = lid_spec);
    lid_printed();
} else if (part == "pin") {
    echo(cadverify_spec = pin_spec);
    pin_printed();
} else {
    echo(cadverify_spec = assembly_spec);
    instance("box", "box") box_closed();
    instance("lid", "lid")
        translate([0, hinge_ymax, H]) rotate([180, 0, 0]) lid_printed();
    instance("pin", "pin")
        translate([pin_x0, hinge_y - pin_off, hinge_z - pin_off]) pin_printed();
}
